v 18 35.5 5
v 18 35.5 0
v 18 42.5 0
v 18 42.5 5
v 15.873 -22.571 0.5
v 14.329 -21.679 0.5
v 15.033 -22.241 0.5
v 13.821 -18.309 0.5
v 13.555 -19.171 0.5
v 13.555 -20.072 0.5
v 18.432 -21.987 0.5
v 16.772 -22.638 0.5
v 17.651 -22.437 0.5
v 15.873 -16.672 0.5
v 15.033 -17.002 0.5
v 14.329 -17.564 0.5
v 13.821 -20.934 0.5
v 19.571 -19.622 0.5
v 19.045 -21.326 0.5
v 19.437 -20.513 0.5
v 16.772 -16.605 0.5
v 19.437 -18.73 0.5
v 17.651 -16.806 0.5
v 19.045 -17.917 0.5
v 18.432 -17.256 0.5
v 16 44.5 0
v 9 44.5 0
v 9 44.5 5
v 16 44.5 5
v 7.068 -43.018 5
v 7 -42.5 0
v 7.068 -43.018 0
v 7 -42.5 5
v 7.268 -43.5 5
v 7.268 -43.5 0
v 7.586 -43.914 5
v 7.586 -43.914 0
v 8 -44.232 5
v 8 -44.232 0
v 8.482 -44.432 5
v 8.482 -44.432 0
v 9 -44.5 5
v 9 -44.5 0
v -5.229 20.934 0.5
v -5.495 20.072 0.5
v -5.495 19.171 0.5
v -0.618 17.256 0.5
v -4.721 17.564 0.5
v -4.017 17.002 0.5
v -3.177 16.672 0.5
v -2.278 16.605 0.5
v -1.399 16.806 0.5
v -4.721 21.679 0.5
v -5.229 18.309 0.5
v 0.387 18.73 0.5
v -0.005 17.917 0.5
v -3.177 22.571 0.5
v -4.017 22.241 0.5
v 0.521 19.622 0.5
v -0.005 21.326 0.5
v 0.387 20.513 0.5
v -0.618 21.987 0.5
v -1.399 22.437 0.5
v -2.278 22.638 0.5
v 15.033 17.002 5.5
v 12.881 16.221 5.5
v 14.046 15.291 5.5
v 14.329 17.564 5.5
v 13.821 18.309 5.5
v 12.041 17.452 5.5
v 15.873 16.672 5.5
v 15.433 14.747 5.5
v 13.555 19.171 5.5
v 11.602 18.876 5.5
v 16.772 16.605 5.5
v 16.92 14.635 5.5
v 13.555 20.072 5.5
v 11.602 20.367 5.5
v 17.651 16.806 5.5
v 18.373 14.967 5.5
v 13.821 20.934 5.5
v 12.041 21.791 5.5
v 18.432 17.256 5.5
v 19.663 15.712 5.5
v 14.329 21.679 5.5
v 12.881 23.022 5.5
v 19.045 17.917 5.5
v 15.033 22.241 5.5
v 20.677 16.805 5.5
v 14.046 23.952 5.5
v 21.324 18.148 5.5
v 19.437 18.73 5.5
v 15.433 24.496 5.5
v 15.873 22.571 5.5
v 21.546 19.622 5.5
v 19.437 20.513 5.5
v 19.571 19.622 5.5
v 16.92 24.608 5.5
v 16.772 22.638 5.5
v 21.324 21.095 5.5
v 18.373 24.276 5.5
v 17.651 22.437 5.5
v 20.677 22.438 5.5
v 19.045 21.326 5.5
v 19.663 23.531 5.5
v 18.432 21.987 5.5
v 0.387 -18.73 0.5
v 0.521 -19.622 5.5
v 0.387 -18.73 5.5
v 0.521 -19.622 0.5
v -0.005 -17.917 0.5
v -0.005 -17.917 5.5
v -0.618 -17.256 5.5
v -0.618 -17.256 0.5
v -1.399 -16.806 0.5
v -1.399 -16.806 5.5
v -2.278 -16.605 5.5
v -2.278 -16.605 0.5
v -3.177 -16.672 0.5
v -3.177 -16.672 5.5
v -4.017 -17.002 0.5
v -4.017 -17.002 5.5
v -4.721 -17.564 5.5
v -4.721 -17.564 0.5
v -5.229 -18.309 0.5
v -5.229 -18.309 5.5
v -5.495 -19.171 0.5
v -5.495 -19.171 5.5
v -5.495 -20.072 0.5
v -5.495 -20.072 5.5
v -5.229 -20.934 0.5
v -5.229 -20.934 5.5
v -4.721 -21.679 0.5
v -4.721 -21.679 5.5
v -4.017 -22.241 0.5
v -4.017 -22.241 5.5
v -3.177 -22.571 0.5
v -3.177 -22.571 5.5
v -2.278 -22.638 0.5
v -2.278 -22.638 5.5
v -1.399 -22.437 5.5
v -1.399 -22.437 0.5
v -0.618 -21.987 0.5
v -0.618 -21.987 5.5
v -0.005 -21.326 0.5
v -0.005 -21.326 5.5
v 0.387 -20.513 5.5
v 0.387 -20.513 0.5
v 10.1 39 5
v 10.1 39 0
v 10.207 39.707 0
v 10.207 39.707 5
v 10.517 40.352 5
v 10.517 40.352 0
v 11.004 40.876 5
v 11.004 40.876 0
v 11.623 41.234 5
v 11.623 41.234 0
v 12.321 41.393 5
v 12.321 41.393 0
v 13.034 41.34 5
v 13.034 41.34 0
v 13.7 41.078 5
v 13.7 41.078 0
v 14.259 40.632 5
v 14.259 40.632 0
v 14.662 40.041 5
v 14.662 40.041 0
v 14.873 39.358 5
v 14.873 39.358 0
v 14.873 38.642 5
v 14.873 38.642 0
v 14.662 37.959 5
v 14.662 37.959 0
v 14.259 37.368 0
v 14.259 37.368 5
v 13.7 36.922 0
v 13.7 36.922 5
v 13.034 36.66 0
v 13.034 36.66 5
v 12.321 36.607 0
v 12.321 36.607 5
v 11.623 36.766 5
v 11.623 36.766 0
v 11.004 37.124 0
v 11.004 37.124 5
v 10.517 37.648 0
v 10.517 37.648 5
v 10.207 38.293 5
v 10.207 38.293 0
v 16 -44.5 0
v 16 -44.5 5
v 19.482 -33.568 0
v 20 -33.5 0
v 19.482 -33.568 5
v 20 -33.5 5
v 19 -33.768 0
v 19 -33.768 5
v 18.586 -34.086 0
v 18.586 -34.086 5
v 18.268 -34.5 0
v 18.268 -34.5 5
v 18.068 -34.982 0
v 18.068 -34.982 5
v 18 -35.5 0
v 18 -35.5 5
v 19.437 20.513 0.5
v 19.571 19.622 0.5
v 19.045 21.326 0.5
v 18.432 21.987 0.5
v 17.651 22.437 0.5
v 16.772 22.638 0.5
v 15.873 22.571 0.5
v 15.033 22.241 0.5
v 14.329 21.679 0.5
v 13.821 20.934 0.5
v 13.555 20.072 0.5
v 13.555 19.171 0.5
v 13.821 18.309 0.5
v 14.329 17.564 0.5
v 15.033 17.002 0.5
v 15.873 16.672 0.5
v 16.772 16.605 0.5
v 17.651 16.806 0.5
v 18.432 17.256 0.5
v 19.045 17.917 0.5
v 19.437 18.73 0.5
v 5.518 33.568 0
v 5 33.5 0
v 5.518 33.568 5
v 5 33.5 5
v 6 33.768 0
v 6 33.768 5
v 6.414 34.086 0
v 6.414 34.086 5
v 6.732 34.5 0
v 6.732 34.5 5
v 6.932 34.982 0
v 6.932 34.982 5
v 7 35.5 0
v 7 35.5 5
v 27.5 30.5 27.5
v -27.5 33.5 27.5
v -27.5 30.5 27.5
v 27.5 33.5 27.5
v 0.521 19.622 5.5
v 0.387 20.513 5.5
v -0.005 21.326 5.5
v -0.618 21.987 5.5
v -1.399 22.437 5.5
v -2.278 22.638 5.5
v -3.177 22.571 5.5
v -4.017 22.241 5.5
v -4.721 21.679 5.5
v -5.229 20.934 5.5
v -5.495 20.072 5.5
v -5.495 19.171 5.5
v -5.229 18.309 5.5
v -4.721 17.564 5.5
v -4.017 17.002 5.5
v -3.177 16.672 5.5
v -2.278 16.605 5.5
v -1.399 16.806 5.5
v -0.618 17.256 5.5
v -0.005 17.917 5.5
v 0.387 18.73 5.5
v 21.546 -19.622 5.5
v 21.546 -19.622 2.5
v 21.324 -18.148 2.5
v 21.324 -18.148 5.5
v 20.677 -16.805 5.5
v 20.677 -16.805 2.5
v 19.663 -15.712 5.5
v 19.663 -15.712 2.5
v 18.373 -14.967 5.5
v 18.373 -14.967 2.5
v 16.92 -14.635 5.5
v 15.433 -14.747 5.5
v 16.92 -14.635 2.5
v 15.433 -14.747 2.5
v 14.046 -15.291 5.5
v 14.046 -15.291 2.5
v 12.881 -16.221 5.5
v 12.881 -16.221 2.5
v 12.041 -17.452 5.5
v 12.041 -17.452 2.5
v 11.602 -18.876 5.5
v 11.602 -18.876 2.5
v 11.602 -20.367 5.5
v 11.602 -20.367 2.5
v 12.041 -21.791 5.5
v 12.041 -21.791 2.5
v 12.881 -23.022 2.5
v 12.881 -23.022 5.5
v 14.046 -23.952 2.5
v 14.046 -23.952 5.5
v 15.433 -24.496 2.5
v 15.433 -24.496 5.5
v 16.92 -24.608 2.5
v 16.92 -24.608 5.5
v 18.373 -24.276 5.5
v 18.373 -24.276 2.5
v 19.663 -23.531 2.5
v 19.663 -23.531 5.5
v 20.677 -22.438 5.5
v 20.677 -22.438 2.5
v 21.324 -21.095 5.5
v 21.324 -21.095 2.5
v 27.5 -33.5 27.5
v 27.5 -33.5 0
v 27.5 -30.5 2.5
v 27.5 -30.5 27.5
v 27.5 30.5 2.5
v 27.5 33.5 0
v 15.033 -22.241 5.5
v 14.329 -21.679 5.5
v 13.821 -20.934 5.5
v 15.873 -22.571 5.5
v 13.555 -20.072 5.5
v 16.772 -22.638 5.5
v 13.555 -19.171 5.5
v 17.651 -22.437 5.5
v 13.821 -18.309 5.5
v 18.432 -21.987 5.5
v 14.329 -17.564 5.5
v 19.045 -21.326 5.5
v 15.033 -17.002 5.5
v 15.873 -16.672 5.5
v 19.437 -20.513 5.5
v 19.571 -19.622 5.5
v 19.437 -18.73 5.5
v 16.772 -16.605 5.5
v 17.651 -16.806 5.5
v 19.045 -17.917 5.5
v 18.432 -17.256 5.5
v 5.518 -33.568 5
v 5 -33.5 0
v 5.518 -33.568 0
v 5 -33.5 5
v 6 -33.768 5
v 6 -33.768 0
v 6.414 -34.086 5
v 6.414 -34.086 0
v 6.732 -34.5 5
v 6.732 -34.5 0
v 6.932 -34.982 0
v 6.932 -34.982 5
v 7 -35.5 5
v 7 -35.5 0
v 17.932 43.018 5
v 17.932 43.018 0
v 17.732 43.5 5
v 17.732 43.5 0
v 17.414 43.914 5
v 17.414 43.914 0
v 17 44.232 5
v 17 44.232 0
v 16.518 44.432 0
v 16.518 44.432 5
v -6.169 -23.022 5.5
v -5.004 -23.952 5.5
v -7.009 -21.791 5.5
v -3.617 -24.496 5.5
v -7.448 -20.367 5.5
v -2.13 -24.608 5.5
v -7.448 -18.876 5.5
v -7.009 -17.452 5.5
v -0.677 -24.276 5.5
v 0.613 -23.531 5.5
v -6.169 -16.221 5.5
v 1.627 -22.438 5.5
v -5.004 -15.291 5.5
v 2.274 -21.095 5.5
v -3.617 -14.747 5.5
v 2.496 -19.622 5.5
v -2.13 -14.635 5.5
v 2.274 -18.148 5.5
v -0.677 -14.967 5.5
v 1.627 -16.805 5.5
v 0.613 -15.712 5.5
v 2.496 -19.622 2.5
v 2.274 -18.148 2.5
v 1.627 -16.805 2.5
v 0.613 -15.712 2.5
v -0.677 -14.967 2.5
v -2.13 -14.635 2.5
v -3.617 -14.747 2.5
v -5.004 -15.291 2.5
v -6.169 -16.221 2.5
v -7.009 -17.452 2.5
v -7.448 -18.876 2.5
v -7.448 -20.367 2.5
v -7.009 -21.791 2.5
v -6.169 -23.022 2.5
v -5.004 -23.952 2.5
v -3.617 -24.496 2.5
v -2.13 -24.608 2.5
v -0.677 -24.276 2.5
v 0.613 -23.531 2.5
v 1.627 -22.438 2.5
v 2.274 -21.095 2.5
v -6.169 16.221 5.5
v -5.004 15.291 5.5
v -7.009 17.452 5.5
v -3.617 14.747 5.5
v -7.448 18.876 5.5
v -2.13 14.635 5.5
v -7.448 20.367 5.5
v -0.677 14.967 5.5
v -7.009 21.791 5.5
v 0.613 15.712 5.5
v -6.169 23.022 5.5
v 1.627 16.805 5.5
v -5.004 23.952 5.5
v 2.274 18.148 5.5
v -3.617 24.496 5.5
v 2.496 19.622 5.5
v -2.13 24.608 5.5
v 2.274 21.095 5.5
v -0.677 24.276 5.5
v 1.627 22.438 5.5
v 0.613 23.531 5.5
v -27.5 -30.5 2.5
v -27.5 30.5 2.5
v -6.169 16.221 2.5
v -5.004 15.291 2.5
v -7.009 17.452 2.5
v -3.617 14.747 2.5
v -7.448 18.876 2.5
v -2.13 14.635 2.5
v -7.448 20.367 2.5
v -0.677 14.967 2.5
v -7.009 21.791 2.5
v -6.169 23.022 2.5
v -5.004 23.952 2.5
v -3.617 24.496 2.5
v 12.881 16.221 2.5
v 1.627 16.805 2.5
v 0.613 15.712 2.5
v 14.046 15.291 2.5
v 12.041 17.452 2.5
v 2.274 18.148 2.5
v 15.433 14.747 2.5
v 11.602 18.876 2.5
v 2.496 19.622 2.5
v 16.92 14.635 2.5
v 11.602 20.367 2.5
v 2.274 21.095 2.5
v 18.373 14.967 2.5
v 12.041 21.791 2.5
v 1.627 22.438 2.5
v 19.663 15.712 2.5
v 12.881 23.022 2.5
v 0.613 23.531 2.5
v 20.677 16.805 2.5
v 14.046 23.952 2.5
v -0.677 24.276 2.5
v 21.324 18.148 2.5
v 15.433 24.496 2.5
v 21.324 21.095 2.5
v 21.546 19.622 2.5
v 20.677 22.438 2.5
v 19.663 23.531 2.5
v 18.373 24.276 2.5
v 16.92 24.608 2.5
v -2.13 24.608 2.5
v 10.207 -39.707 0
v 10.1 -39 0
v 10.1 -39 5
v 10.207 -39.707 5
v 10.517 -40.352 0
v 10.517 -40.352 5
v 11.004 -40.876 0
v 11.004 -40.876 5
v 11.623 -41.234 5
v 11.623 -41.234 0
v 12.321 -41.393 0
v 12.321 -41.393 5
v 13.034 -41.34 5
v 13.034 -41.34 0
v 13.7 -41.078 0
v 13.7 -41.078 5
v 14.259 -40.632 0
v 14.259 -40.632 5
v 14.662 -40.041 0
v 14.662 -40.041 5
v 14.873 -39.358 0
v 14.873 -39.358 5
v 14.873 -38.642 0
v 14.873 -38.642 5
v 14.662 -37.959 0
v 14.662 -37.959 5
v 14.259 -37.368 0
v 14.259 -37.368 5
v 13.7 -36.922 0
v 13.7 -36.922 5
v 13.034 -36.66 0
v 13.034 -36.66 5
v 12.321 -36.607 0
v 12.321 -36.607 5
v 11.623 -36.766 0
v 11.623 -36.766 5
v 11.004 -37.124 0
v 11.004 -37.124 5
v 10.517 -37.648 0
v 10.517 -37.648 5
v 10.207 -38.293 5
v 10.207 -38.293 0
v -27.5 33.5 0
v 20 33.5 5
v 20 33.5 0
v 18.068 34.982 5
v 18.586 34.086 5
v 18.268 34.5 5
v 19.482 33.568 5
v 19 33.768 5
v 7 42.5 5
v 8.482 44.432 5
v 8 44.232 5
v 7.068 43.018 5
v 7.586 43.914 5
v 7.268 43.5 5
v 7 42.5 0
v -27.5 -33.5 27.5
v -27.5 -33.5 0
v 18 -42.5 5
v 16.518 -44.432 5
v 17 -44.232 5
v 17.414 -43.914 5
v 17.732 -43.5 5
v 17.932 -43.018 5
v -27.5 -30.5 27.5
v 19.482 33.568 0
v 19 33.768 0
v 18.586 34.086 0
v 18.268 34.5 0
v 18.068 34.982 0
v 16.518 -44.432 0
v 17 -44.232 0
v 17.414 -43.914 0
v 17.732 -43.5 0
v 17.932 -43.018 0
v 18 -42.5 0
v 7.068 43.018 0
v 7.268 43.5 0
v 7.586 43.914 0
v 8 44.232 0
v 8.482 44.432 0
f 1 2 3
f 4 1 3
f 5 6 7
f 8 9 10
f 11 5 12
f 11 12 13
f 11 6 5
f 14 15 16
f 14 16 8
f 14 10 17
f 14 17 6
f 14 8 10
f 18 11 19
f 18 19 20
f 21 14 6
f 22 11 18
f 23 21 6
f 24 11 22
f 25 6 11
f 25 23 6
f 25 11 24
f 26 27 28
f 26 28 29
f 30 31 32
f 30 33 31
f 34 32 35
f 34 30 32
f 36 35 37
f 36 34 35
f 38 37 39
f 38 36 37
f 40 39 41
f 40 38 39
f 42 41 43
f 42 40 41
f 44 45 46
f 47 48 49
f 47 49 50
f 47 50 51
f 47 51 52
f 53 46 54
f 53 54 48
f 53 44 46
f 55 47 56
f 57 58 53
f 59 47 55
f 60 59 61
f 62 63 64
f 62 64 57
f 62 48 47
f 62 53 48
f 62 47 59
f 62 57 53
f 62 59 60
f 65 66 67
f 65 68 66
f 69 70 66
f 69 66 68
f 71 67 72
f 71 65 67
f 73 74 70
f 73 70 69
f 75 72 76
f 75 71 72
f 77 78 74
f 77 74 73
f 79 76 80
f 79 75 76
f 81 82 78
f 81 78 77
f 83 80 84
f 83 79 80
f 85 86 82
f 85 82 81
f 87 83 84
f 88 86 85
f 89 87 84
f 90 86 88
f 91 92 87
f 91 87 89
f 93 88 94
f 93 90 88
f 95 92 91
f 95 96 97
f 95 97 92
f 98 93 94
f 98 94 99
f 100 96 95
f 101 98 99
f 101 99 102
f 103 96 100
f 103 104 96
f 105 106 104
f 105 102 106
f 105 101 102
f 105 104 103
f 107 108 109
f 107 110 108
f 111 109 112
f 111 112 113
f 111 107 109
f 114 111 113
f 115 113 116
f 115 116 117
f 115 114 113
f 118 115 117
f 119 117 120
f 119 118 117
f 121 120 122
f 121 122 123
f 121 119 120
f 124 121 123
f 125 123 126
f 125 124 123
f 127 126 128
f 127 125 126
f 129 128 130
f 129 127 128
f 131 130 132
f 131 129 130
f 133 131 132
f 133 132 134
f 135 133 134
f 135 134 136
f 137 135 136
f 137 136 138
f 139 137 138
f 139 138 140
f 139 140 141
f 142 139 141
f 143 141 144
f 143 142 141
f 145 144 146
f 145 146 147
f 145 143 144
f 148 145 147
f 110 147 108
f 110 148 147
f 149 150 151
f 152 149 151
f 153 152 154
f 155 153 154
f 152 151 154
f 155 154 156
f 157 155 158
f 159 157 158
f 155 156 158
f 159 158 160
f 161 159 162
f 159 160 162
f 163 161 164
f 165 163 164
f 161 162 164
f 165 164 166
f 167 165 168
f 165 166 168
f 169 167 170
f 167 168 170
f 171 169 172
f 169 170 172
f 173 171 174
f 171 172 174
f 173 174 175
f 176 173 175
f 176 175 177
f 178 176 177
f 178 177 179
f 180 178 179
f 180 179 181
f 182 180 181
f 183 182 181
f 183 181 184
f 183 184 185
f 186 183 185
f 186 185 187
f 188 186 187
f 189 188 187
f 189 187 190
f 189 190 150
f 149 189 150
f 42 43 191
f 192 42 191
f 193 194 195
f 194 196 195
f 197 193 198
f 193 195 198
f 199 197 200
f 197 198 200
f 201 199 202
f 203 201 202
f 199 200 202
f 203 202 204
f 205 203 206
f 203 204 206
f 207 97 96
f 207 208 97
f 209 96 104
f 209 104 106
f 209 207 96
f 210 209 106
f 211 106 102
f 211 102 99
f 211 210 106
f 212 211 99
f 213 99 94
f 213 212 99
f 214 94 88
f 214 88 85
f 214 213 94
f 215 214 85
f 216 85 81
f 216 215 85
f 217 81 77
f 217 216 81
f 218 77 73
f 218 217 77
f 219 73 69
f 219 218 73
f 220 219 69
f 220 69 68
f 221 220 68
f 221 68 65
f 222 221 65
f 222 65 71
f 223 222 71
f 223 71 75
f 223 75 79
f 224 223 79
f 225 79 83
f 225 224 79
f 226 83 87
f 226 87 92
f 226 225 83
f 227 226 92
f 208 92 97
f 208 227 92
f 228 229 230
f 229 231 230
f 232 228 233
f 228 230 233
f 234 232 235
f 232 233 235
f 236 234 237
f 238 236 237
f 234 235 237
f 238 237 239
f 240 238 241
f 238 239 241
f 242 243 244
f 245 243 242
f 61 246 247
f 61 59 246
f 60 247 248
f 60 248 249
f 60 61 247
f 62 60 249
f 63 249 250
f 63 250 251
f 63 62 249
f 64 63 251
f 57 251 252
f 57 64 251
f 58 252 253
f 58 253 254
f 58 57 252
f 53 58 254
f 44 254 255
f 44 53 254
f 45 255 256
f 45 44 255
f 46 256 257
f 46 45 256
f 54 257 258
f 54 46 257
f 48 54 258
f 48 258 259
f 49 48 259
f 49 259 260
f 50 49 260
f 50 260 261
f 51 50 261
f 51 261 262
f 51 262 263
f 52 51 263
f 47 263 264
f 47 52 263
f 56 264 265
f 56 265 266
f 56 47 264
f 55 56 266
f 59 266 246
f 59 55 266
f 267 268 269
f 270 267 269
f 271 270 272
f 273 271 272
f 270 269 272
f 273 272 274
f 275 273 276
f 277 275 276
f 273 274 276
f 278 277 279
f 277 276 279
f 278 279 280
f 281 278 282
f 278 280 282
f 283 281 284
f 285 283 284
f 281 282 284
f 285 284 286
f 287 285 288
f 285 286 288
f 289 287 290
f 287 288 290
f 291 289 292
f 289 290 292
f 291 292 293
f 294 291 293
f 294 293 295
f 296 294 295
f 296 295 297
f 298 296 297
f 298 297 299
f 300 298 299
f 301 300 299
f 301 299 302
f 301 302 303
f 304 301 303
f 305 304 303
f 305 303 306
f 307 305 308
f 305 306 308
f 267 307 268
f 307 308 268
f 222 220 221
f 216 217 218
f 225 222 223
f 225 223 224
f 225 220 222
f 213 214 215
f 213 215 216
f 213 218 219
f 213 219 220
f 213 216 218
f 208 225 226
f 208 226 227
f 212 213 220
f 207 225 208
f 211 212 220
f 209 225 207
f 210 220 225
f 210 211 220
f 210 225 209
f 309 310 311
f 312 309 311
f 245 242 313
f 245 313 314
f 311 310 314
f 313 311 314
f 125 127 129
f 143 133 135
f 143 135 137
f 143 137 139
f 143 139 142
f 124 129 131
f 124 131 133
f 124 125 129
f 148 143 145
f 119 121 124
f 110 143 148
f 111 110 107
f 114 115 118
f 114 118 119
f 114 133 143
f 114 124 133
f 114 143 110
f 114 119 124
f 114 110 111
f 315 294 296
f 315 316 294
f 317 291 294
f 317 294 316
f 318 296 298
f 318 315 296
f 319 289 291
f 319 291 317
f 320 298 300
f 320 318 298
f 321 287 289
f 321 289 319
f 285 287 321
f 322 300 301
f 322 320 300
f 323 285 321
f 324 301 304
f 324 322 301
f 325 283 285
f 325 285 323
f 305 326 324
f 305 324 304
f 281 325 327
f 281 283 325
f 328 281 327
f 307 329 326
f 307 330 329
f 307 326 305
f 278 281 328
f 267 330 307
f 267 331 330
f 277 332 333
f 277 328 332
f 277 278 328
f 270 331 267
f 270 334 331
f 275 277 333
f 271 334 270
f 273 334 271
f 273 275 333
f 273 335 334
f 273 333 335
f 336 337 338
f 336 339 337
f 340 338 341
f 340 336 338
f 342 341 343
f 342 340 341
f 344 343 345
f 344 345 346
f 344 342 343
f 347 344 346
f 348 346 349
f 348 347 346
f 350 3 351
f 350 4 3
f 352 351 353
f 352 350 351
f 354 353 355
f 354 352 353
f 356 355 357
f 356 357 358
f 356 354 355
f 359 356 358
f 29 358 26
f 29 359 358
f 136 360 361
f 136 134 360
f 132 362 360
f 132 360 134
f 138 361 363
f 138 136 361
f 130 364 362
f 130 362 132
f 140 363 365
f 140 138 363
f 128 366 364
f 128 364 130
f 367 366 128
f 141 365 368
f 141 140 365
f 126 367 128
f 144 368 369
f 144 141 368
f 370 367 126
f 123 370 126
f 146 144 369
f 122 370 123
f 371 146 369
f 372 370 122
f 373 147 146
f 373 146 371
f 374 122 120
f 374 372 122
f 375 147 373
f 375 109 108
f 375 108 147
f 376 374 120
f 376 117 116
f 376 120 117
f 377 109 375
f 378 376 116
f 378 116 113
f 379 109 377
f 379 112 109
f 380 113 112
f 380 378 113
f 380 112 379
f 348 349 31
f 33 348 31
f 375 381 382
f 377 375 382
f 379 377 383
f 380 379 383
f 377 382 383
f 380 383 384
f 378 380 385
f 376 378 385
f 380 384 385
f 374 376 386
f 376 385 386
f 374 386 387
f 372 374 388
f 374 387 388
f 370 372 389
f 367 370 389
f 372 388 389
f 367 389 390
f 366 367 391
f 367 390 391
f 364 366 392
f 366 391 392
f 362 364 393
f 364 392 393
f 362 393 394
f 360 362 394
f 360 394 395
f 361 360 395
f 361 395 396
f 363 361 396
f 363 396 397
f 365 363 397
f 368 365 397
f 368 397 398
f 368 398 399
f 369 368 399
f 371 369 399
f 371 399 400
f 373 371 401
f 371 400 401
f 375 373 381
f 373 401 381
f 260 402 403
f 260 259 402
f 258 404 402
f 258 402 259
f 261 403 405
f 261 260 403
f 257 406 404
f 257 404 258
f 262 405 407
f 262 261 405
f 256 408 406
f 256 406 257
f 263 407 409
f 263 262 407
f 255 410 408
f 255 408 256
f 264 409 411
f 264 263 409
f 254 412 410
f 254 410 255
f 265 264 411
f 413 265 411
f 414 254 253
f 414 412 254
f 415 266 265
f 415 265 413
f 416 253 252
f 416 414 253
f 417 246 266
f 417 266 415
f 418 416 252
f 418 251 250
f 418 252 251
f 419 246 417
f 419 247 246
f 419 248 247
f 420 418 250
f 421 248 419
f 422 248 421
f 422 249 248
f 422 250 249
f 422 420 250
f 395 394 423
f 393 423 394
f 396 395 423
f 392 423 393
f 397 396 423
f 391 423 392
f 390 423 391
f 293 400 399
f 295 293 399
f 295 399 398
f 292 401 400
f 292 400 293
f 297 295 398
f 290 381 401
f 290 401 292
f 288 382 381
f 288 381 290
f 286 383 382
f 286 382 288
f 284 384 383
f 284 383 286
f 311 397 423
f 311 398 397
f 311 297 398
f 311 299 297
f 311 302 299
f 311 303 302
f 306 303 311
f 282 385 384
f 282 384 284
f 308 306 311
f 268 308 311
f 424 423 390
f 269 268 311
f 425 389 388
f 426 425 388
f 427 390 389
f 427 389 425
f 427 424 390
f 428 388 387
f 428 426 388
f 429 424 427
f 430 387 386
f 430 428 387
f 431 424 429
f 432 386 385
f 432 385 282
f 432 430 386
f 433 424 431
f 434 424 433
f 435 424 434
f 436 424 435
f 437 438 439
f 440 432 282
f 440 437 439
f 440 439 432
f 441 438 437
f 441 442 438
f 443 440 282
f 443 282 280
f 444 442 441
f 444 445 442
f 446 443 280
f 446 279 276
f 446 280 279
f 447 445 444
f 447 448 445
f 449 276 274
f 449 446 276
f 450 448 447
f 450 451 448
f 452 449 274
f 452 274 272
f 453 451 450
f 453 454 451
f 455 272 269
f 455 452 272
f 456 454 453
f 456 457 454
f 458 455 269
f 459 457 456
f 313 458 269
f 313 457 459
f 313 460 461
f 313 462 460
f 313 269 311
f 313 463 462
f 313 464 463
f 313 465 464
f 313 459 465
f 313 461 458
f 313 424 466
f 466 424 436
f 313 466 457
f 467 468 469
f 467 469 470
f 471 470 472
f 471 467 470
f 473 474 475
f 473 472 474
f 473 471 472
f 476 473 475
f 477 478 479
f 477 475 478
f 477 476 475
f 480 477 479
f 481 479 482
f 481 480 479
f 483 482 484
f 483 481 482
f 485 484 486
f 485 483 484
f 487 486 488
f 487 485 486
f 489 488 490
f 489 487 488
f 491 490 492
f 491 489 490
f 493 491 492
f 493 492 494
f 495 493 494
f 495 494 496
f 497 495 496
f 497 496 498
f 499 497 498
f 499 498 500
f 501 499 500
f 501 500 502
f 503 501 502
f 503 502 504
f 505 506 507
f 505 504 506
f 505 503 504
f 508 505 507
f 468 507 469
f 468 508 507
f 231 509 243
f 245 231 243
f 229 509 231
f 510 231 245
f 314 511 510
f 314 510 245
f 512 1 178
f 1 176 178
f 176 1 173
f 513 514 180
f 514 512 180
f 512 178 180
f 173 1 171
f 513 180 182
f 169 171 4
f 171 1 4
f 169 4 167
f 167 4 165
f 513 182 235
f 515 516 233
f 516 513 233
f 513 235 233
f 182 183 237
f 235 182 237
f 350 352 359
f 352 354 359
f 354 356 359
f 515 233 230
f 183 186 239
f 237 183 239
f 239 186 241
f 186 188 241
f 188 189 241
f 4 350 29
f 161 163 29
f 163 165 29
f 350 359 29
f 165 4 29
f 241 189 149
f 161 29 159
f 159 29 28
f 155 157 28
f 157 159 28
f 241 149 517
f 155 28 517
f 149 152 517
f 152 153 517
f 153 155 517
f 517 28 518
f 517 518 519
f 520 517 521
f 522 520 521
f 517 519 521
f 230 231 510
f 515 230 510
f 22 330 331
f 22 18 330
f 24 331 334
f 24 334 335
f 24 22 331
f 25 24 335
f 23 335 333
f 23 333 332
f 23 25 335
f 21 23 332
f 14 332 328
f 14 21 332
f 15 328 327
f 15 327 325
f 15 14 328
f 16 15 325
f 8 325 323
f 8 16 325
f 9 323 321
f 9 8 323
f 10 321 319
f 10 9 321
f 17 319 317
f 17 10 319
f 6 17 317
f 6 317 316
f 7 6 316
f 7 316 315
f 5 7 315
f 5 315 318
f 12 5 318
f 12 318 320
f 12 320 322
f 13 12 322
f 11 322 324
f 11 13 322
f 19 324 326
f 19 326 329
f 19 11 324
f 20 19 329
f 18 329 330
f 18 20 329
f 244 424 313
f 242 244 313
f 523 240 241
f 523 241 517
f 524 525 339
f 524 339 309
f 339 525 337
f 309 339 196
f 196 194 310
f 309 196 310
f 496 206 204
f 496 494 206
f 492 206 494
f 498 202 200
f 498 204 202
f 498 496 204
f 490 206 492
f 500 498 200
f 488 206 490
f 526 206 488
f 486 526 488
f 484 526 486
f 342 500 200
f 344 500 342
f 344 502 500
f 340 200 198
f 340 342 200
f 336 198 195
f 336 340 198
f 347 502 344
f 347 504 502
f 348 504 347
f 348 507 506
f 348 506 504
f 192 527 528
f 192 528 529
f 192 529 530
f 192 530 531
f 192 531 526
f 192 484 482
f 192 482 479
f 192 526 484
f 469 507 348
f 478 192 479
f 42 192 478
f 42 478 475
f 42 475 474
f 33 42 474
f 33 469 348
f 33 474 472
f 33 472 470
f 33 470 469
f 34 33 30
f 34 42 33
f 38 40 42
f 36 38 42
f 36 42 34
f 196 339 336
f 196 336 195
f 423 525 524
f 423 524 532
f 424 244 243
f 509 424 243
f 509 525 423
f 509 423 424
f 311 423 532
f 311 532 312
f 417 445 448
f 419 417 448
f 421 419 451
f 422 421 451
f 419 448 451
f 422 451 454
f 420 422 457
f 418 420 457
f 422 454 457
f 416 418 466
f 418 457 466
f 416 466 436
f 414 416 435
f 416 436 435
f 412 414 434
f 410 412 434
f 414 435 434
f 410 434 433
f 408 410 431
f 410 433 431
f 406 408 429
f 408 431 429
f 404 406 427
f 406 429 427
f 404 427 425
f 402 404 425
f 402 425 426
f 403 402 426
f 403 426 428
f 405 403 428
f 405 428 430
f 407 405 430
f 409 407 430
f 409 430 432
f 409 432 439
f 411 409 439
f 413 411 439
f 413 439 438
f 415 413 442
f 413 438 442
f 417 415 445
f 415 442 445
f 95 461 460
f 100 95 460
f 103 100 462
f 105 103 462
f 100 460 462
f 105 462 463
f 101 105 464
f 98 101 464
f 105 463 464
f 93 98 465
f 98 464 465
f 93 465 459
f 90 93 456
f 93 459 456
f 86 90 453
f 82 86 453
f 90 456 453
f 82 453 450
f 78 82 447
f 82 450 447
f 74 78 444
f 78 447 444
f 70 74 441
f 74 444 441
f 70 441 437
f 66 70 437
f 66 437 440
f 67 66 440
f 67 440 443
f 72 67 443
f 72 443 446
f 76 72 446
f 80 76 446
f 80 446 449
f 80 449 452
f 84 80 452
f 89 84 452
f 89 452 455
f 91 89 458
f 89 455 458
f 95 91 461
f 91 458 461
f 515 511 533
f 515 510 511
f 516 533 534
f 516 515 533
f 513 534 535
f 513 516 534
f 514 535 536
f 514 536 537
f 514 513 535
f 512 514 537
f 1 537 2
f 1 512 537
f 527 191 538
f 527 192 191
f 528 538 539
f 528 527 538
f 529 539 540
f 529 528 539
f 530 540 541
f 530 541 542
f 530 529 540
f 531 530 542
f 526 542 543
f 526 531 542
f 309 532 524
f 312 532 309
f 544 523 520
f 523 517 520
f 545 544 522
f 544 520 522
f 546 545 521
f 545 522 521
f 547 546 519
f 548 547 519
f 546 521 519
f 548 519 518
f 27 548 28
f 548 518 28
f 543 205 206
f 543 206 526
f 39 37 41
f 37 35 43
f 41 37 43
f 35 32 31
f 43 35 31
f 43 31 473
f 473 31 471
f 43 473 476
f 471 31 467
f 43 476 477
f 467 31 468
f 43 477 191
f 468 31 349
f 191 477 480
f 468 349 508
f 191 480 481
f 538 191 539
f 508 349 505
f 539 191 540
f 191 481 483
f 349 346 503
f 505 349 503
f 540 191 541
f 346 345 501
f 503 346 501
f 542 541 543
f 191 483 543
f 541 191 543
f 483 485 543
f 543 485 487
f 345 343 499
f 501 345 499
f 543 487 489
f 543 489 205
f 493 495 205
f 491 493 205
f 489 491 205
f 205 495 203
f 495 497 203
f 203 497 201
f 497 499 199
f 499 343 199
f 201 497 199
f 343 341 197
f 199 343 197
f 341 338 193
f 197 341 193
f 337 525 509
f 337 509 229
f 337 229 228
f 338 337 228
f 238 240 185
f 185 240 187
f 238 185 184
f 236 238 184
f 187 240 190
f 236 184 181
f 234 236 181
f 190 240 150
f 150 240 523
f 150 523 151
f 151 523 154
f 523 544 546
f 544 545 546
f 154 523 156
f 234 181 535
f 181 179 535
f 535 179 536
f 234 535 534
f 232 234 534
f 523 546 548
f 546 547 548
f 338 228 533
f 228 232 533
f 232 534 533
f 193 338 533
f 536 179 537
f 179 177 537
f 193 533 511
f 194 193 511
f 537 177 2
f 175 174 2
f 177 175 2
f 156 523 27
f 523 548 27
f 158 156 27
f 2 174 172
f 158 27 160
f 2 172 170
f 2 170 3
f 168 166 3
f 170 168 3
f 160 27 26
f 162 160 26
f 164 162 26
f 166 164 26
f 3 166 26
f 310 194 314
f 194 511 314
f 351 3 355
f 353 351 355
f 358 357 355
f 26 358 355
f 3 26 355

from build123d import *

# Parameters (mm, degrees)
SKETCH1_W            = 55
SKETCH1_H            = 67
BOSS_EXTRUDE1_DEPTH  = 2.5
SKETCH2_W            = 55
SKETCH2_H            = 3
BOSS_EXTRUDE2_DEPTH  = 25
SKETCH3_R            = 5
SKETCH3_R_2          = 3.025
BOSS_EXTRUDE3_DEPTH  = 3
CUT_EXTRUDE1_START   = -2
SKETCH4_R            = 3.025
CUT_EXTRUDE1_DEPTH   = 2
SKETCH5_W            = 5.5
SKETCH5_H            = 11
BOSS_EXTRUDE4_DEPTH  = 5
M4_CLEARANCE_HOLE1_D = 4.8
FILLET3_R            = 2


with BuildPart() as part:
    # Sketch1 → Boss-Extrude1 (new body)
    with BuildSketch(Plane.XY):
        Rectangle(SKETCH1_W, SKETCH1_H)
    extrude(amount=BOSS_EXTRUDE1_DEPTH)

    # Sketch2 → Boss-Extrude2 (add)
    with BuildSketch(Plane.XY.offset(2.5)):
        with Locations((0, 32)):
            Rectangle(SKETCH2_W, SKETCH2_H)
        with Locations((0, -32)):
            Rectangle(SKETCH2_W, SKETCH2_H)
    extrude(amount=BOSS_EXTRUDE2_DEPTH)

    # Sketch3 → Boss-Extrude3 (add)
    # profile 1 of 4: a face of its own
    with BuildSketch(Plane.XY.offset(2.5)):
        with Locations((-2.504, 19.6215)):
            Circle(SKETCH3_R)
        with Locations((-2.504, 19.6215)):
            Circle(SKETCH3_R_2, mode=Mode.SUBTRACT)
    # profile 2 of 4: a face of its own
    with BuildSketch(Plane.XY.offset(2.5)):
        with Locations((16.546, 19.6215)):
            Circle(SKETCH3_R)
        with Locations((16.546, 19.6215)):
            Circle(SKETCH3_R_2, mode=Mode.SUBTRACT)
    # profile 3 of 4: a face of its own
    with BuildSketch(Plane.XY.offset(2.5)):
        with Locations((16.546, -19.6215)):
            Circle(SKETCH3_R)
        with Locations((16.546, -19.6215)):
            Circle(SKETCH3_R_2, mode=Mode.SUBTRACT)
    # profile 4 of 4: a face of its own
    with BuildSketch(Plane.XY.offset(2.5)):
        with Locations((-2.504, -19.6215)):
            Circle(SKETCH3_R)
        with Locations((-2.504, -19.6215)):
            Circle(SKETCH3_R_2, mode=Mode.SUBTRACT)
    extrude(amount=BOSS_EXTRUDE3_DEPTH)

    # Sketch4 → Cut-Extrude1 (cut)
    with BuildSketch(Plane.XY.offset(2.5).offset(CUT_EXTRUDE1_START)):
        with Locations((16.546, -19.6215)):
            Circle(SKETCH4_R)
        with Locations((-2.504, -19.6215)):
            Circle(SKETCH4_R)
        with Locations((16.546, 19.6215)):
            Circle(SKETCH4_R)
        with Locations((-2.504, 19.6215)):
            Circle(SKETCH4_R)
    extrude(amount=CUT_EXTRUDE1_DEPTH, mode=Mode.SUBTRACT)

    # Sketch5 → Boss-Extrude4 (add)
    with BuildSketch(Plane(origin=(0, 0, 0), x_dir=(-1, 0, 0), z_dir=(0, 0, -1))):
        with Locations((-9.75, 39)):
            Rectangle(SKETCH5_W, SKETCH5_H)
        with Locations((-15.25, 39)):
            Rectangle(SKETCH5_W, SKETCH5_H)
    boss_extrude4 = extrude(amount=-BOSS_EXTRUDE4_DEPTH)

    # M4 Clearance Hole1 (through all)
    with Locations(Plane.XY.offset(5)):
        with Locations((12.5, 39)):
            m4_clearance_hole1 = Hole(M4_CLEARANCE_HOLE1_D / 2)

    # Mirror2: Boss-Extrude4, M4 Clearance Hole1 across plane
    add(boss_extrude4.mirror(Plane.ZX))
    add(m4_clearance_hole1.mirror(Plane.ZX), mode=Mode.SUBTRACT)

    # Fillet3
    fillet3_edges = [part.edges().sort_by_distance(p)[0] for p in [
        (7, -44.5, 2.5),
        (18, -44.5, 2.5),
        (18, -33.5, 2.5),
        (7, -33.5, 2.5),
        (18, 44.5, 2.5),
        (7, 44.5, 2.5),
        (7, 33.5, 2.5),
        (18, 33.5, 2.5),
    ]]
    fillet(fillet3_edges, radius=FILLET3_R)


solid = part.part
